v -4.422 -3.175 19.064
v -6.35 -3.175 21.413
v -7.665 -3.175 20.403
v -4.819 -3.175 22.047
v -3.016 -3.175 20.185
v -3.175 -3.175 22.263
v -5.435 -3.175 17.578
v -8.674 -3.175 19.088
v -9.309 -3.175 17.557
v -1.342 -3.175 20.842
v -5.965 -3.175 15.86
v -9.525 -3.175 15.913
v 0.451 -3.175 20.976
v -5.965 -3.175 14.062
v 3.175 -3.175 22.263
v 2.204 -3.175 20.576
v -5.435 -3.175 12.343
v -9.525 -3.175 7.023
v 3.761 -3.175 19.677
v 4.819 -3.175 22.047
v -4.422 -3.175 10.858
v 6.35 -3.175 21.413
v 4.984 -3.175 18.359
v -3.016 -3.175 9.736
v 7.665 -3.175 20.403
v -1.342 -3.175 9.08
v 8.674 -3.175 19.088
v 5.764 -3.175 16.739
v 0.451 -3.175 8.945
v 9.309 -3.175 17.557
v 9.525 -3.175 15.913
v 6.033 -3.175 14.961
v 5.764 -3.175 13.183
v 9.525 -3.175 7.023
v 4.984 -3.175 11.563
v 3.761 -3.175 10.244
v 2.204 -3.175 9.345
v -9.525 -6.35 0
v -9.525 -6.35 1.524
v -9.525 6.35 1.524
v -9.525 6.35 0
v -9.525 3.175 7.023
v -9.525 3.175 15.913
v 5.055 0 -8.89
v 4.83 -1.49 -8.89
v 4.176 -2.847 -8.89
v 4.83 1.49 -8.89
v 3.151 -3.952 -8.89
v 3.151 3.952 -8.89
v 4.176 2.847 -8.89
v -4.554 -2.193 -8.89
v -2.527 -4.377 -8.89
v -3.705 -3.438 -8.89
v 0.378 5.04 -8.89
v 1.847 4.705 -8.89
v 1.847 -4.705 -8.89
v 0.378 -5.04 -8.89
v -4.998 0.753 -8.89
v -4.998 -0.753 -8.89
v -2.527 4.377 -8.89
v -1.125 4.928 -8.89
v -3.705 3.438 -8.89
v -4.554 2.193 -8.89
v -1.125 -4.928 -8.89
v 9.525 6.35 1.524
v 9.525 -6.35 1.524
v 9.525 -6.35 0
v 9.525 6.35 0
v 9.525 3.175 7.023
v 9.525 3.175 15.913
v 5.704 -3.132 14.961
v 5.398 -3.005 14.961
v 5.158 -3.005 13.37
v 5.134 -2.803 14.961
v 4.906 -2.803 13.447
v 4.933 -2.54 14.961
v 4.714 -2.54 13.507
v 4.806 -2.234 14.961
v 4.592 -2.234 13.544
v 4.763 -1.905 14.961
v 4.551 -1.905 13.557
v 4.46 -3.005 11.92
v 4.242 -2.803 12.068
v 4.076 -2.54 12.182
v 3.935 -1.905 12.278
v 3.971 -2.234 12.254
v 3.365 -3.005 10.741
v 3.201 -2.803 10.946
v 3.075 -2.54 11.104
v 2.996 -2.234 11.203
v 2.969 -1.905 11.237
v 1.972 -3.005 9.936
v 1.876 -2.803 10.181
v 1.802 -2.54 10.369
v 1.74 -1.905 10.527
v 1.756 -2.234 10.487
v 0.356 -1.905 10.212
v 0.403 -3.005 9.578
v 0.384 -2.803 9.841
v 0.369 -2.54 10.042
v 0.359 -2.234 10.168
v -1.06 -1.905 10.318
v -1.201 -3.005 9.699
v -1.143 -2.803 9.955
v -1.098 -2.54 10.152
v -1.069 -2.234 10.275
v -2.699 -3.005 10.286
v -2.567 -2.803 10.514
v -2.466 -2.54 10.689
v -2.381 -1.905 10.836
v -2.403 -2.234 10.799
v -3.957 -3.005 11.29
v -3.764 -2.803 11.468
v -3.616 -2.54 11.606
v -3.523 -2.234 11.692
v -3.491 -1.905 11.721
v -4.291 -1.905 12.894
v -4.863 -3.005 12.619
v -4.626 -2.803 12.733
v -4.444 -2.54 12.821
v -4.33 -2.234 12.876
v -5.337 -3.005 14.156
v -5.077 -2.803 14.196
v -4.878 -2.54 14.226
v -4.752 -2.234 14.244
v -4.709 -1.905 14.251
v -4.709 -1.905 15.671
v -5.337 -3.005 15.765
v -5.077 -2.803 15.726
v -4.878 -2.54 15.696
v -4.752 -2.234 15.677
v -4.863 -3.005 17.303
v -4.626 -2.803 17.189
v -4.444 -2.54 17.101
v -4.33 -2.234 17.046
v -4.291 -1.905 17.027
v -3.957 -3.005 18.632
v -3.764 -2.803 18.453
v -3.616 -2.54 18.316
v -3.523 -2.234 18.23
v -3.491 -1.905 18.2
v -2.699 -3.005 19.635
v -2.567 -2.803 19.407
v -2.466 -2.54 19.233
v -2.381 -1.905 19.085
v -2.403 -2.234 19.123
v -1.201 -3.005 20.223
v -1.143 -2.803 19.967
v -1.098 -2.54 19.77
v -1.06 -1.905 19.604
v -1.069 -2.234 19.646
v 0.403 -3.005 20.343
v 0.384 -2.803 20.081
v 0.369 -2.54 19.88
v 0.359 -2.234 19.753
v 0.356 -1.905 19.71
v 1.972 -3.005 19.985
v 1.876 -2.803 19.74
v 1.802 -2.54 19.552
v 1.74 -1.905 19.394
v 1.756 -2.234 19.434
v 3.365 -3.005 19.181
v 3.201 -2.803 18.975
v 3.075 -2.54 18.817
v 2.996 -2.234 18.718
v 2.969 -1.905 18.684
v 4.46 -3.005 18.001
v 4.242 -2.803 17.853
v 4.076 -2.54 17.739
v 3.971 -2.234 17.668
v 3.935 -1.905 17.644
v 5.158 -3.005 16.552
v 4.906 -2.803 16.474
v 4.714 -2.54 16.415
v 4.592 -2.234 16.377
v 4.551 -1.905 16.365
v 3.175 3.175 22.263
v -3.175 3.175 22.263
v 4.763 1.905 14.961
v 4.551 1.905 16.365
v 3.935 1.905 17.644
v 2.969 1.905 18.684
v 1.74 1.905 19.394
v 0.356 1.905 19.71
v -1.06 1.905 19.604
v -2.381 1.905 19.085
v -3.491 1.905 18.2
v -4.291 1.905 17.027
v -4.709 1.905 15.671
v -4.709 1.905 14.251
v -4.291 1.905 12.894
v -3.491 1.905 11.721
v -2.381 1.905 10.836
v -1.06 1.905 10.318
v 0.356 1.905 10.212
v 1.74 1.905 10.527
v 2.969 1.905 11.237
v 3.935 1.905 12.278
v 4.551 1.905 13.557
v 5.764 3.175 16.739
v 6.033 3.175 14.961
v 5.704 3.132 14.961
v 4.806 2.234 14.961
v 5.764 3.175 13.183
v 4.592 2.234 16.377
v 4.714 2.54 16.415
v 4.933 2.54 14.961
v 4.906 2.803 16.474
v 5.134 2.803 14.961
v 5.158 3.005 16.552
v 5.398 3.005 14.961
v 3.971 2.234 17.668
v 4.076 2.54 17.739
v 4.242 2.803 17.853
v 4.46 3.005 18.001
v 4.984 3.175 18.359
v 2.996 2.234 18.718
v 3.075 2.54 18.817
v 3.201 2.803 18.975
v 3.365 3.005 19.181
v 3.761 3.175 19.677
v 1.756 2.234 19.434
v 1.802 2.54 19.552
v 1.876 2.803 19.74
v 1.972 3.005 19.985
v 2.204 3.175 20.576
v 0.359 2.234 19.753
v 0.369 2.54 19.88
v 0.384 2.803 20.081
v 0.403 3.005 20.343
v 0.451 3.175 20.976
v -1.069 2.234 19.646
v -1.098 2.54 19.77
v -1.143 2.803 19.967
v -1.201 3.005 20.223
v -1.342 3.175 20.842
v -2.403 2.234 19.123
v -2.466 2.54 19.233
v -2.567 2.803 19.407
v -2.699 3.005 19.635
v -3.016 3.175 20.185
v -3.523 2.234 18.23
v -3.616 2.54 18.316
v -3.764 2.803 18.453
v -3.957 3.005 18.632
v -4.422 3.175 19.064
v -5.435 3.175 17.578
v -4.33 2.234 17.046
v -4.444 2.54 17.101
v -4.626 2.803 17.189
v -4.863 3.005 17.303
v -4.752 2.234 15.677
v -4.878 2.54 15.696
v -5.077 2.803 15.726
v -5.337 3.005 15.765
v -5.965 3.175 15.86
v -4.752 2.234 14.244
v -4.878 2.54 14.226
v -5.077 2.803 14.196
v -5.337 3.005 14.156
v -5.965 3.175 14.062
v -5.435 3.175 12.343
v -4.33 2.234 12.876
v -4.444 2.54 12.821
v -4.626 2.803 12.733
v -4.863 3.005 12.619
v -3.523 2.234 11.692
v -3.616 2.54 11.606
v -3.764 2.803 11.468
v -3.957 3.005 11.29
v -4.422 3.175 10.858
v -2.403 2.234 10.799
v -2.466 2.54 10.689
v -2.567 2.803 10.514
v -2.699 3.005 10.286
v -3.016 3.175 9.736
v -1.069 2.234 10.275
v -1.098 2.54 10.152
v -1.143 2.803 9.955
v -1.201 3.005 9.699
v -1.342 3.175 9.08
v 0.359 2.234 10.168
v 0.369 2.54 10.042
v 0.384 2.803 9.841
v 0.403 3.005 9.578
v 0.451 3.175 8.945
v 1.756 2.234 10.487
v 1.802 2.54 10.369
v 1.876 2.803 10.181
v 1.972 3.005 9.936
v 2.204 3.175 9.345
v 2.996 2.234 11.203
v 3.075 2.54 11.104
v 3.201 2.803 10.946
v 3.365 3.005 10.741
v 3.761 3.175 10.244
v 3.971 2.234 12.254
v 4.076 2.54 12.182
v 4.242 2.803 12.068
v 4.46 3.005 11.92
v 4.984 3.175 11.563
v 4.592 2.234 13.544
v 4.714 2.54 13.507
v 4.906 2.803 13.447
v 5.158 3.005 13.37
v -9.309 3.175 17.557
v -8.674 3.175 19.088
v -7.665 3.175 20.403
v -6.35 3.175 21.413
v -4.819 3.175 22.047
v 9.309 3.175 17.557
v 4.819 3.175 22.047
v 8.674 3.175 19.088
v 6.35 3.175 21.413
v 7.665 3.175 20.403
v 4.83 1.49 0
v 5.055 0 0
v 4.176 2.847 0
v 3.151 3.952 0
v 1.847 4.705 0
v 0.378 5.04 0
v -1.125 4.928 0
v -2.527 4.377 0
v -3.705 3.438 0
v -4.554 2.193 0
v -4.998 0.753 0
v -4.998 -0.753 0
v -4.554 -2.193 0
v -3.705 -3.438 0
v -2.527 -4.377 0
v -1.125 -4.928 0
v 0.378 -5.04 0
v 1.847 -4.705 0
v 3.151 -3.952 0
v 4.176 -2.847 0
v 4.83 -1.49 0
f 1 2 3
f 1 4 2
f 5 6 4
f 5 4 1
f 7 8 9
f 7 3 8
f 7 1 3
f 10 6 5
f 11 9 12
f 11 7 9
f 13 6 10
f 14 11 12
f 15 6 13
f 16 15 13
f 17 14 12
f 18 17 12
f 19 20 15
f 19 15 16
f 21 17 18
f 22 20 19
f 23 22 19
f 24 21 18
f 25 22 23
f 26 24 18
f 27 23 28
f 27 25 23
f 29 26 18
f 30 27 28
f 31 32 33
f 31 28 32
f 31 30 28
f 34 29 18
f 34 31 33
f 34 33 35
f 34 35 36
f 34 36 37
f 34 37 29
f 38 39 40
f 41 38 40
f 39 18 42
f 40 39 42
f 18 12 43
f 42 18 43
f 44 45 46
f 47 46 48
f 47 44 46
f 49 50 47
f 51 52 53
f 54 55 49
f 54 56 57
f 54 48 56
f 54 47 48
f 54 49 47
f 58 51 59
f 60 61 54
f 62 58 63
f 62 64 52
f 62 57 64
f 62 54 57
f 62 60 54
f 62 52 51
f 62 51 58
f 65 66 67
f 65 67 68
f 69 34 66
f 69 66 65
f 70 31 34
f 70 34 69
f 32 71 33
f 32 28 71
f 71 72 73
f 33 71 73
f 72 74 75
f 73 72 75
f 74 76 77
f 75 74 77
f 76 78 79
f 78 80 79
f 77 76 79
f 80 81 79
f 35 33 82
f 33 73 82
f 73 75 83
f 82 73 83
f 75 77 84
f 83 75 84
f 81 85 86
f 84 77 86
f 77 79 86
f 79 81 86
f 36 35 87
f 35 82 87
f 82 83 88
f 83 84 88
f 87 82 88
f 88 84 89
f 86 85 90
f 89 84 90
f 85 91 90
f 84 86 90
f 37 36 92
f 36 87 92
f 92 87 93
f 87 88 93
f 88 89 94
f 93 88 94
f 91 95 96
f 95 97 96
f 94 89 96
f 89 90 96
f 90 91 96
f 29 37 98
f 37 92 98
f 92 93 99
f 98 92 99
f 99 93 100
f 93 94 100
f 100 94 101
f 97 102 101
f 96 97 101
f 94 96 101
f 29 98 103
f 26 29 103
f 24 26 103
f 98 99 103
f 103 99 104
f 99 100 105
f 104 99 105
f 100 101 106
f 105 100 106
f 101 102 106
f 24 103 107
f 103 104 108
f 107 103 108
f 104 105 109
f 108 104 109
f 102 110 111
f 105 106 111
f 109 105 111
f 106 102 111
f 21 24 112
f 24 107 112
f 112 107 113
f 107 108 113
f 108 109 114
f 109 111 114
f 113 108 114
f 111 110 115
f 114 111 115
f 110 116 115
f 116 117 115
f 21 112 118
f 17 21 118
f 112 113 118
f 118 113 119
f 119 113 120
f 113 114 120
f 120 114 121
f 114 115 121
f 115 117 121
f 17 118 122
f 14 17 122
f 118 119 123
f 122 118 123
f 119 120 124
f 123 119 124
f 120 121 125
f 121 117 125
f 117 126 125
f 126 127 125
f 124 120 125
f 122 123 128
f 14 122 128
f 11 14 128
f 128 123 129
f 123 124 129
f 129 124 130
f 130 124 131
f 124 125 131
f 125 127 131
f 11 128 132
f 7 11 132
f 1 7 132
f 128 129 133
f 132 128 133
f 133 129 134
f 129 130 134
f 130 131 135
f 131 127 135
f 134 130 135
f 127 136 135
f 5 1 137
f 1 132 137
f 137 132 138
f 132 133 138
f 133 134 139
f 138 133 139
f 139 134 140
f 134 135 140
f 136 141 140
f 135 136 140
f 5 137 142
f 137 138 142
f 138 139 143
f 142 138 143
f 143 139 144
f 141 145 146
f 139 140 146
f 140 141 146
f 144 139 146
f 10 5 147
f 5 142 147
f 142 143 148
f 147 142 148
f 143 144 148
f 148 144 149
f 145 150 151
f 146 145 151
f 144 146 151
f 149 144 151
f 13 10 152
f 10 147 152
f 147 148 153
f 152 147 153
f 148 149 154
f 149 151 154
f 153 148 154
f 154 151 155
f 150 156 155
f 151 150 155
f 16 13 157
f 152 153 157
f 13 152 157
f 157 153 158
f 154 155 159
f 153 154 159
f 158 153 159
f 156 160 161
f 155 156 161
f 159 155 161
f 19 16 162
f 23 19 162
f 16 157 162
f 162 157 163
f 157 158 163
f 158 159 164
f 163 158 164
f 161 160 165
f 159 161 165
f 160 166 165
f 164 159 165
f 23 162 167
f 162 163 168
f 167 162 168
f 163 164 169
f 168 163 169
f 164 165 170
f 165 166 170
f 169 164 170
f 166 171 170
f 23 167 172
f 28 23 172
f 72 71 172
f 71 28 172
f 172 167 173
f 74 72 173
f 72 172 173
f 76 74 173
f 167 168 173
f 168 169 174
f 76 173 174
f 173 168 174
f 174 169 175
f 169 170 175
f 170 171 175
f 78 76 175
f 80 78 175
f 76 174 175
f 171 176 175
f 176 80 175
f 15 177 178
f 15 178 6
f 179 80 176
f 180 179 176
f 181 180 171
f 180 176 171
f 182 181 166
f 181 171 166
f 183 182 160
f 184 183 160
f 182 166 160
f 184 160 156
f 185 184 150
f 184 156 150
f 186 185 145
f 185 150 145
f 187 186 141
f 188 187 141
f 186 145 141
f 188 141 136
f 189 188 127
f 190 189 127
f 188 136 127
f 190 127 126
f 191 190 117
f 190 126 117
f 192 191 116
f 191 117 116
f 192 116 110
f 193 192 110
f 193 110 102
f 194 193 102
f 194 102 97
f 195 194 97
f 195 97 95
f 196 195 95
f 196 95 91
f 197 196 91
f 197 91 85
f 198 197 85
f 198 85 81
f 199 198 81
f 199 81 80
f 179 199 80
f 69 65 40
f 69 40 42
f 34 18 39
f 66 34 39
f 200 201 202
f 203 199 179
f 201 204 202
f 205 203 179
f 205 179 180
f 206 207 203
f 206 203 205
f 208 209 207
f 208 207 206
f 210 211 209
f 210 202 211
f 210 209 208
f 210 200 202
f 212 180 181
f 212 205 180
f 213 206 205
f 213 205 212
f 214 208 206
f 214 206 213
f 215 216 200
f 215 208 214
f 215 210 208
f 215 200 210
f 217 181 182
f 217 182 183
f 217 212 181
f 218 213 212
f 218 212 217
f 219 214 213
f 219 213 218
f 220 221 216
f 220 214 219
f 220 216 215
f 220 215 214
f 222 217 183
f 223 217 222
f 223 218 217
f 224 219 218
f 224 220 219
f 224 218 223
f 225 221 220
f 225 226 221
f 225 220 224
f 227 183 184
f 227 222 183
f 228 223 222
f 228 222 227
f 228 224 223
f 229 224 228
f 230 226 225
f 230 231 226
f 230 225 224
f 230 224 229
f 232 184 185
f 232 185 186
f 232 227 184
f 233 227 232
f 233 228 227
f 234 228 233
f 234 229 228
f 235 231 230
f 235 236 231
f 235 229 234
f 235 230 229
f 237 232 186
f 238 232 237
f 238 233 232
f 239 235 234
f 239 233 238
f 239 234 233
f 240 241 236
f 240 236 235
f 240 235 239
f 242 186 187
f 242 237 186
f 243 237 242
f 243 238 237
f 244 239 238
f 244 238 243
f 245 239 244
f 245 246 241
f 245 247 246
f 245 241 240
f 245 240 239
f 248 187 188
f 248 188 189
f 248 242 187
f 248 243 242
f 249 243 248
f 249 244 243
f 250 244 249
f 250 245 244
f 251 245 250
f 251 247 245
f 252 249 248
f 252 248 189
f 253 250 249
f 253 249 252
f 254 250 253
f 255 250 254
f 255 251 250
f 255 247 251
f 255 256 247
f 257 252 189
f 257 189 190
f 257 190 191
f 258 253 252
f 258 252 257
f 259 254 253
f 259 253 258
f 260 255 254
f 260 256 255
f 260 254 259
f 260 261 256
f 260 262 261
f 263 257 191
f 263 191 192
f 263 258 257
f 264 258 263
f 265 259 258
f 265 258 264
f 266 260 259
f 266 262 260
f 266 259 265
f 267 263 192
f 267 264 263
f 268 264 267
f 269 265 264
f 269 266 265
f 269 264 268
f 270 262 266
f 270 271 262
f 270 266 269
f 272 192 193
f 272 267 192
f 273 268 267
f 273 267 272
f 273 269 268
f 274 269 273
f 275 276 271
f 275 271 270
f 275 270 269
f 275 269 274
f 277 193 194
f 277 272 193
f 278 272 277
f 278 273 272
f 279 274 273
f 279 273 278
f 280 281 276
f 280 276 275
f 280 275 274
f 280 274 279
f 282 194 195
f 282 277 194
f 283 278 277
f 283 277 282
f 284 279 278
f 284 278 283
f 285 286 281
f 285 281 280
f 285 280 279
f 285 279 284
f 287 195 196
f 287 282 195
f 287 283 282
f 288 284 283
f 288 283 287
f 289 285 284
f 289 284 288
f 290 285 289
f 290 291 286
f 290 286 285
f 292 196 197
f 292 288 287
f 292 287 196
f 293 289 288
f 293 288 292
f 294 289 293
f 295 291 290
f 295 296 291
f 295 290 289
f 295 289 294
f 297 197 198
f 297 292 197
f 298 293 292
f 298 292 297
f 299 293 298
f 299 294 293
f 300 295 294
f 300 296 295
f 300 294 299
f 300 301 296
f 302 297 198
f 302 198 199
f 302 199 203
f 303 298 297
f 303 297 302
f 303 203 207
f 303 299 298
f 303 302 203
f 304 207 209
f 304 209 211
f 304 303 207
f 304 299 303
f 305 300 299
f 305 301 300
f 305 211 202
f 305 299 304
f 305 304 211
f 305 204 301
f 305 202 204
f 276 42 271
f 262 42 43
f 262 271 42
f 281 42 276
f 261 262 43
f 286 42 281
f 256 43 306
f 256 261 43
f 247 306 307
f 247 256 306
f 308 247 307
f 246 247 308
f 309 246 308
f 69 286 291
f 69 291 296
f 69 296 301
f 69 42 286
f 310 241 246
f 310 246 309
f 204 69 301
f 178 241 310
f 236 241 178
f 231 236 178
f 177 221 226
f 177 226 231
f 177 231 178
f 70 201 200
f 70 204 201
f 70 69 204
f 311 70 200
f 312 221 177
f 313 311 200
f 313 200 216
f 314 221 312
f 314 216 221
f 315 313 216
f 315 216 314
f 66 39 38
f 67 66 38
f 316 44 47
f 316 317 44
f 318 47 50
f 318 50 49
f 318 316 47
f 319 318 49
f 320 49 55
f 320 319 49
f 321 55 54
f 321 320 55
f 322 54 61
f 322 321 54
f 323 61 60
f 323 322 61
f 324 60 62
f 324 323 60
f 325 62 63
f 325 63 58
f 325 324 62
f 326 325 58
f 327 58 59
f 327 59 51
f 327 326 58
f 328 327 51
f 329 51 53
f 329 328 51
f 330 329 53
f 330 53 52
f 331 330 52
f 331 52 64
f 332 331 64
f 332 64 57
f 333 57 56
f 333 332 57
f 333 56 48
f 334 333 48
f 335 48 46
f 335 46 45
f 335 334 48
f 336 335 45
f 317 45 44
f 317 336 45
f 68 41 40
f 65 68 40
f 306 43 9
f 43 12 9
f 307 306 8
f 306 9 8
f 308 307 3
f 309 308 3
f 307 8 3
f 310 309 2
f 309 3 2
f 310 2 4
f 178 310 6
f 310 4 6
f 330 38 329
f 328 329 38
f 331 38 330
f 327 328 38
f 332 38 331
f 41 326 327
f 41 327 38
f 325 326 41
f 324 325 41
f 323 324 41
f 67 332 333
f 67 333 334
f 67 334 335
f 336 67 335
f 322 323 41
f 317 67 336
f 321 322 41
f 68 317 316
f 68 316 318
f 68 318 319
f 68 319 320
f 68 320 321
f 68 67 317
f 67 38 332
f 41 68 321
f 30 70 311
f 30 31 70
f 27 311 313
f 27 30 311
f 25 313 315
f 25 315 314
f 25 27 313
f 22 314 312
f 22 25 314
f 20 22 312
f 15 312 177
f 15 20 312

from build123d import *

# Parameters (mm, degrees)
F0_W          = 5.0546
F0_H          = 8.89
F3_DEPTH      = 9.525
F4_R          = 6.35
F5_R          = 4.7625
F6_DEPTH      = 6.351
F6_DEPTH_BACK = 6.351
F7_R          = 1.27


with BuildPart() as f1:
    # F0 (on Front) → F1 (revolve)
    with BuildSketch(Plane.XZ):
        with Locations((2.5273, -4.445)):
            Rectangle(F0_W, F0_H)
    revolve(axis=Axis((0, 0, -4.445), (0, 0, 1)))

    # F2 (on Right) → F3 (join, symmetric)
    with BuildSketch(Plane.YZ):
        Polygon((-6.35, 1.524), (-6.35, 0), (6.35, 0), (6.35, 1.524), (3.175, 7.023261), (3.175, 22.263261), (-3.175, 22.263261), (-3.175, 7.023261), align=None)
    extrude(amount=F3_DEPTH, both=True)

    # F4
    f4_edges = [f1.edges().sort_by_distance(p)[0] for p in [
        (9.525, 0, 22.263261),
        (-9.525, 0, 22.263261),
    ]]
    fillet(f4_edges, radius=F4_R)

    # F5 (on Front) → F6 (cut, two sides)
    with BuildSketch(Plane.XZ) as f6_sk:
        with Locations((0, 14.960761)):
            Circle(F5_R)
    extrude(amount=F6_DEPTH, mode=Mode.SUBTRACT)
    extrude(f6_sk.sketch, amount=-F6_DEPTH_BACK, mode=Mode.SUBTRACT)

    # F7
    f7_edges = [f1.edges().sort_by_distance(p)[0] for p in [
        (-4.7625, -3.175, 14.960761),
        (-4.7625, 3.175, 14.960761),
    ]]
    fillet(f7_edges, radius=F7_R)


solid = f1.part
